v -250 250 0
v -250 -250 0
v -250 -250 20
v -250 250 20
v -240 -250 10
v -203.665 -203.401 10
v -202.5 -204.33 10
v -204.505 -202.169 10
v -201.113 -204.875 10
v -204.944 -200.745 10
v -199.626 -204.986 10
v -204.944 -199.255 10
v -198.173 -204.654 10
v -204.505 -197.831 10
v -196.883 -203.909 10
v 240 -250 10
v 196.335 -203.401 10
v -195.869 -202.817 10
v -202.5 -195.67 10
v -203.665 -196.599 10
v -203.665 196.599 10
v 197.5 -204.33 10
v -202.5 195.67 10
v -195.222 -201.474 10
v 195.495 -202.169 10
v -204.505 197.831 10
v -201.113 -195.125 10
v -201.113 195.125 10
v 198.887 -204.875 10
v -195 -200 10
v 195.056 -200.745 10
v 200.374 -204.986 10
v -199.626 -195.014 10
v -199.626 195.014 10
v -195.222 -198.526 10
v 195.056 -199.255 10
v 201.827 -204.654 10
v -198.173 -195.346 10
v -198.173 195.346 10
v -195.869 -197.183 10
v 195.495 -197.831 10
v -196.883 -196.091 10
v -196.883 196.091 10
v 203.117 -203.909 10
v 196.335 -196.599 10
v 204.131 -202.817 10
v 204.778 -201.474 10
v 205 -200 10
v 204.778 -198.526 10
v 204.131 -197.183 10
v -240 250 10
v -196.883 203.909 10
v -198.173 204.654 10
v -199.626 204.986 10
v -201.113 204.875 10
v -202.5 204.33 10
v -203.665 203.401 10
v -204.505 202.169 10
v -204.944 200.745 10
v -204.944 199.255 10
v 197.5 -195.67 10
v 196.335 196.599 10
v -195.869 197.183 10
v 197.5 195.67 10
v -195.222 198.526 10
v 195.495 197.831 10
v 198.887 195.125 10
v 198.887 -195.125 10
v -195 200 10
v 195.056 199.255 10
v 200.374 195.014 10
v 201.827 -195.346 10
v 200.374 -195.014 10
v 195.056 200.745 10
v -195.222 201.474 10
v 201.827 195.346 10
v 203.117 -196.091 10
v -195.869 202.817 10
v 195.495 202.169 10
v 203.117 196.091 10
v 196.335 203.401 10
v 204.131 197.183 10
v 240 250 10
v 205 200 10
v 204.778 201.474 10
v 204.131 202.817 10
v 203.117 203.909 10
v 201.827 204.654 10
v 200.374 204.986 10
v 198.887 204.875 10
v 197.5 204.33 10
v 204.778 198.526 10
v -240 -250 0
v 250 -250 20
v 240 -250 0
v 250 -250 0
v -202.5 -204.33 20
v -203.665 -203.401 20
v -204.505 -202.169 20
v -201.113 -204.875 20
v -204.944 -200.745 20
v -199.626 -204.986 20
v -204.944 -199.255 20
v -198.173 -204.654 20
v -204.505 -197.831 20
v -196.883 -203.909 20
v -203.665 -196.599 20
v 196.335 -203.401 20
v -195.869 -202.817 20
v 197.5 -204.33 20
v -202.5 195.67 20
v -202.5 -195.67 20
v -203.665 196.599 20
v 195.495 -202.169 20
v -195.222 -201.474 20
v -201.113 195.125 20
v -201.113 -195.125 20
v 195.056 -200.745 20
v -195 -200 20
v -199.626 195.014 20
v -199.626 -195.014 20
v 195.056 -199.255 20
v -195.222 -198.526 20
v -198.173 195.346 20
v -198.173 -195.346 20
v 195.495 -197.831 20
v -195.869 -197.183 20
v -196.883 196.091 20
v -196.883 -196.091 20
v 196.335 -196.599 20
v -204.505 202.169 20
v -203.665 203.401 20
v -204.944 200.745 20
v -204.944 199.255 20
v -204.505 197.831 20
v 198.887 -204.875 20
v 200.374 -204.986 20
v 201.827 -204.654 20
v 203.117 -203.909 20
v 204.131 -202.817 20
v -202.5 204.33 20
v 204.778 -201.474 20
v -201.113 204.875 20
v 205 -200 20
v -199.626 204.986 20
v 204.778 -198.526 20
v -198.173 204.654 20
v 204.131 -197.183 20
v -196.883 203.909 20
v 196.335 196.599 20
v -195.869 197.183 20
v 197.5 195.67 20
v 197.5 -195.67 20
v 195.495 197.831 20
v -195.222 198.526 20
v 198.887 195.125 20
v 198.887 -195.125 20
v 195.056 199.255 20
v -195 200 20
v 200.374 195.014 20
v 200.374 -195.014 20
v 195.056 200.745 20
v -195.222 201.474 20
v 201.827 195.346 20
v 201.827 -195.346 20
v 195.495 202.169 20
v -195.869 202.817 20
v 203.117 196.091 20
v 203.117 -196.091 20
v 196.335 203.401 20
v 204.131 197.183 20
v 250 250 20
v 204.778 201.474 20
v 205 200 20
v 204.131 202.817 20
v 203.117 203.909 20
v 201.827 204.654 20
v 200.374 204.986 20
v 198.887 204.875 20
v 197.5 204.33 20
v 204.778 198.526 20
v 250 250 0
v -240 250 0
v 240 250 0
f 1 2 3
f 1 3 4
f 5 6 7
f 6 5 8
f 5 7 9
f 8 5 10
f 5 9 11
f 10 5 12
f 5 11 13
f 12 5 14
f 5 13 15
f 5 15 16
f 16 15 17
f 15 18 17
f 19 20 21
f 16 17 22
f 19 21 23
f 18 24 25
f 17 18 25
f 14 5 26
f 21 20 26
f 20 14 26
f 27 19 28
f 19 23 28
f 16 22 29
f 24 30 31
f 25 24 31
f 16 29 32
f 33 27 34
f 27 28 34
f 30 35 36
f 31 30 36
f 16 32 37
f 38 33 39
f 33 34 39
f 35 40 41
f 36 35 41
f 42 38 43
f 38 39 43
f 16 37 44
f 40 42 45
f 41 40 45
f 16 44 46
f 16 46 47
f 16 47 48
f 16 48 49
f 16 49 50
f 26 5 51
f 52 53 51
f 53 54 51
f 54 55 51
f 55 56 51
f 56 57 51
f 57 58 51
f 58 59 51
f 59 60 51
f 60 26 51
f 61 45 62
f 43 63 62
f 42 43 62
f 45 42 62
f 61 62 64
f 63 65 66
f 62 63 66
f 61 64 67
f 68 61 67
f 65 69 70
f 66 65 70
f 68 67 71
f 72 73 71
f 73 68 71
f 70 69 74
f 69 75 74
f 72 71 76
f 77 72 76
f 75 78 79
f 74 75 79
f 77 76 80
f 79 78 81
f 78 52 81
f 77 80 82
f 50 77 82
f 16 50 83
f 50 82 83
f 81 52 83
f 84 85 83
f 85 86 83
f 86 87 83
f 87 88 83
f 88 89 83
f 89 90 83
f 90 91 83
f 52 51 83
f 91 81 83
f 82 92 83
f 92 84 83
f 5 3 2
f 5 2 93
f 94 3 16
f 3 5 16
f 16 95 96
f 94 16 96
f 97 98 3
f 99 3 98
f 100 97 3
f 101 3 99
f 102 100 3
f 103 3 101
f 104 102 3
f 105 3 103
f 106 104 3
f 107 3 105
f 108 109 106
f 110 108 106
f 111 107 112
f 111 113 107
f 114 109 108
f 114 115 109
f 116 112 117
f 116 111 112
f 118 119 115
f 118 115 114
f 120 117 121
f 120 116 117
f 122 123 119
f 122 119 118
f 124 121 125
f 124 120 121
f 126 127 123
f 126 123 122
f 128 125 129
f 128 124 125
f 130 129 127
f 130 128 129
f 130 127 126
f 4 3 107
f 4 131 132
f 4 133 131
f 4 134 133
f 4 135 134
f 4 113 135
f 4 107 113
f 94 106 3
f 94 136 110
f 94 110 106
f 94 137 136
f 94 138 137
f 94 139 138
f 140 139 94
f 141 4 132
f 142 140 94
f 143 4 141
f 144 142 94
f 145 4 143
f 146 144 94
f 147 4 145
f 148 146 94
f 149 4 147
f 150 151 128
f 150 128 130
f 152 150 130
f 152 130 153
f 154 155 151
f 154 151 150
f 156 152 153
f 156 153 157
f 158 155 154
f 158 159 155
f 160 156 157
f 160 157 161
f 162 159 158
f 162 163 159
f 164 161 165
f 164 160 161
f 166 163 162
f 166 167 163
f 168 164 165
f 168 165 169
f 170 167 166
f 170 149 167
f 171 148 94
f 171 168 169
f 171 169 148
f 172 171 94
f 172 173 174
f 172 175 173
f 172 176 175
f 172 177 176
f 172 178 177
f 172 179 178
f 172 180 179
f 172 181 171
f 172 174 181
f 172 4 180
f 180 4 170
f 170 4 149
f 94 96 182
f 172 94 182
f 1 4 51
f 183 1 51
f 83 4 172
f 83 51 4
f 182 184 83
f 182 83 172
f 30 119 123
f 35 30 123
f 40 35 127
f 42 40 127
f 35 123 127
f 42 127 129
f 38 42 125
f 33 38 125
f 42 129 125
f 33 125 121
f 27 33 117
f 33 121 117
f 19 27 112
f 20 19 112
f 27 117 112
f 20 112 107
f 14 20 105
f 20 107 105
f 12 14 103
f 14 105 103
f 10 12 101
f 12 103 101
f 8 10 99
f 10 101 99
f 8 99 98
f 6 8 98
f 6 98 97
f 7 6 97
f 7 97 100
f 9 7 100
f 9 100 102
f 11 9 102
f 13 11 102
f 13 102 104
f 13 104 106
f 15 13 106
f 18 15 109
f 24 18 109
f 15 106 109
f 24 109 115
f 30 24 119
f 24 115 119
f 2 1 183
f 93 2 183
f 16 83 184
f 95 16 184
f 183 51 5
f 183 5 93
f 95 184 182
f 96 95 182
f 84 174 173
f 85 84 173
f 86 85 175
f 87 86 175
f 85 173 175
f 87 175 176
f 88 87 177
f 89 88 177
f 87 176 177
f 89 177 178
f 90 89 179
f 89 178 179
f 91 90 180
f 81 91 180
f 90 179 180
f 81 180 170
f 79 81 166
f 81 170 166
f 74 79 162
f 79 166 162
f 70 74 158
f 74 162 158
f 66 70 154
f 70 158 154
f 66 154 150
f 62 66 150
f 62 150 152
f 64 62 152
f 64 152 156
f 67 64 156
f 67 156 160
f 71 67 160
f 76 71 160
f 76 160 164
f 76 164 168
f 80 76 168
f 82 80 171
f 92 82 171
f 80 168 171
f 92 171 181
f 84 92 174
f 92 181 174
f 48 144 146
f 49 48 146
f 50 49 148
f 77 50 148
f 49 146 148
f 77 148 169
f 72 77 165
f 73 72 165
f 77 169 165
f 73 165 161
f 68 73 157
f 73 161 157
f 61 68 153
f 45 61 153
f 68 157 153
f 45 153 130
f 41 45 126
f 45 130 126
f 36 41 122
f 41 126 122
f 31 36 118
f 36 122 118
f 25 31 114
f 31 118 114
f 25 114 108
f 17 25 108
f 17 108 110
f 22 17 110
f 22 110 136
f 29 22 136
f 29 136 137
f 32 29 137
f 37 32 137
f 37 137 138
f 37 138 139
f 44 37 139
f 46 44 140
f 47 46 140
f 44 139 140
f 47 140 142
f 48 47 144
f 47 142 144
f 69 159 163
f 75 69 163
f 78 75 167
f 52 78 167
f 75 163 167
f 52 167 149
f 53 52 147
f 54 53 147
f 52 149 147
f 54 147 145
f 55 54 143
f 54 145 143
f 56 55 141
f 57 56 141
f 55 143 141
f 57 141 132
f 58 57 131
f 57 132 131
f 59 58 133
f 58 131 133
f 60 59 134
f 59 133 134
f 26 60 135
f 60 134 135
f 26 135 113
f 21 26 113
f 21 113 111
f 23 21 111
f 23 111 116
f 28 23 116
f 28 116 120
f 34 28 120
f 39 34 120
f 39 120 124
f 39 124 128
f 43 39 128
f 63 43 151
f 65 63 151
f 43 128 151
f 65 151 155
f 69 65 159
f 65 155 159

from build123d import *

# Parameters (mm, degrees)
SKETCH1_W           = 500
SKETCH1_H           = 500
BOSS_EXTRUDE1_DEPTH = 20
SKETCH2_W           = 480
SKETCH2_H           = 10
CUT_EXTRUDE1_DEPTH  = 500
SKETCH3_R           = 5
CUT_EXTRUDE2_DEPTH  = 10


with BuildPart() as part:
    # Sketch1 → Boss-Extrude1 (new body)
    with BuildSketch(Plane.XY):
        Rectangle(SKETCH1_W, SKETCH1_H)
    extrude(amount=BOSS_EXTRUDE1_DEPTH)

    # Sketch2 → Cut-Extrude1 (cut)
    with BuildSketch(Plane(origin=(0, 250, 0), x_dir=(1, 0, 0), z_dir=(0, 1, 0))):
        with Locations((0, -5)):
            Rectangle(SKETCH2_W, SKETCH2_H)
    extrude(amount=-CUT_EXTRUDE1_DEPTH, mode=Mode.SUBTRACT)

    # Sketch3 → Cut-Extrude2 (cut)
    with BuildSketch(Plane.XY.offset(20)):
        with Locations((-200, 200)):
            Circle(SKETCH3_R)
        with Locations((200, 200)):
            Circle(SKETCH3_R)
        with Locations((-200, -200)):
            Circle(SKETCH3_R)
        with Locations((200, -200)):
            Circle(SKETCH3_R)
    extrude(amount=-CUT_EXTRUDE2_DEPTH, mode=Mode.SUBTRACT)


solid = part.part
